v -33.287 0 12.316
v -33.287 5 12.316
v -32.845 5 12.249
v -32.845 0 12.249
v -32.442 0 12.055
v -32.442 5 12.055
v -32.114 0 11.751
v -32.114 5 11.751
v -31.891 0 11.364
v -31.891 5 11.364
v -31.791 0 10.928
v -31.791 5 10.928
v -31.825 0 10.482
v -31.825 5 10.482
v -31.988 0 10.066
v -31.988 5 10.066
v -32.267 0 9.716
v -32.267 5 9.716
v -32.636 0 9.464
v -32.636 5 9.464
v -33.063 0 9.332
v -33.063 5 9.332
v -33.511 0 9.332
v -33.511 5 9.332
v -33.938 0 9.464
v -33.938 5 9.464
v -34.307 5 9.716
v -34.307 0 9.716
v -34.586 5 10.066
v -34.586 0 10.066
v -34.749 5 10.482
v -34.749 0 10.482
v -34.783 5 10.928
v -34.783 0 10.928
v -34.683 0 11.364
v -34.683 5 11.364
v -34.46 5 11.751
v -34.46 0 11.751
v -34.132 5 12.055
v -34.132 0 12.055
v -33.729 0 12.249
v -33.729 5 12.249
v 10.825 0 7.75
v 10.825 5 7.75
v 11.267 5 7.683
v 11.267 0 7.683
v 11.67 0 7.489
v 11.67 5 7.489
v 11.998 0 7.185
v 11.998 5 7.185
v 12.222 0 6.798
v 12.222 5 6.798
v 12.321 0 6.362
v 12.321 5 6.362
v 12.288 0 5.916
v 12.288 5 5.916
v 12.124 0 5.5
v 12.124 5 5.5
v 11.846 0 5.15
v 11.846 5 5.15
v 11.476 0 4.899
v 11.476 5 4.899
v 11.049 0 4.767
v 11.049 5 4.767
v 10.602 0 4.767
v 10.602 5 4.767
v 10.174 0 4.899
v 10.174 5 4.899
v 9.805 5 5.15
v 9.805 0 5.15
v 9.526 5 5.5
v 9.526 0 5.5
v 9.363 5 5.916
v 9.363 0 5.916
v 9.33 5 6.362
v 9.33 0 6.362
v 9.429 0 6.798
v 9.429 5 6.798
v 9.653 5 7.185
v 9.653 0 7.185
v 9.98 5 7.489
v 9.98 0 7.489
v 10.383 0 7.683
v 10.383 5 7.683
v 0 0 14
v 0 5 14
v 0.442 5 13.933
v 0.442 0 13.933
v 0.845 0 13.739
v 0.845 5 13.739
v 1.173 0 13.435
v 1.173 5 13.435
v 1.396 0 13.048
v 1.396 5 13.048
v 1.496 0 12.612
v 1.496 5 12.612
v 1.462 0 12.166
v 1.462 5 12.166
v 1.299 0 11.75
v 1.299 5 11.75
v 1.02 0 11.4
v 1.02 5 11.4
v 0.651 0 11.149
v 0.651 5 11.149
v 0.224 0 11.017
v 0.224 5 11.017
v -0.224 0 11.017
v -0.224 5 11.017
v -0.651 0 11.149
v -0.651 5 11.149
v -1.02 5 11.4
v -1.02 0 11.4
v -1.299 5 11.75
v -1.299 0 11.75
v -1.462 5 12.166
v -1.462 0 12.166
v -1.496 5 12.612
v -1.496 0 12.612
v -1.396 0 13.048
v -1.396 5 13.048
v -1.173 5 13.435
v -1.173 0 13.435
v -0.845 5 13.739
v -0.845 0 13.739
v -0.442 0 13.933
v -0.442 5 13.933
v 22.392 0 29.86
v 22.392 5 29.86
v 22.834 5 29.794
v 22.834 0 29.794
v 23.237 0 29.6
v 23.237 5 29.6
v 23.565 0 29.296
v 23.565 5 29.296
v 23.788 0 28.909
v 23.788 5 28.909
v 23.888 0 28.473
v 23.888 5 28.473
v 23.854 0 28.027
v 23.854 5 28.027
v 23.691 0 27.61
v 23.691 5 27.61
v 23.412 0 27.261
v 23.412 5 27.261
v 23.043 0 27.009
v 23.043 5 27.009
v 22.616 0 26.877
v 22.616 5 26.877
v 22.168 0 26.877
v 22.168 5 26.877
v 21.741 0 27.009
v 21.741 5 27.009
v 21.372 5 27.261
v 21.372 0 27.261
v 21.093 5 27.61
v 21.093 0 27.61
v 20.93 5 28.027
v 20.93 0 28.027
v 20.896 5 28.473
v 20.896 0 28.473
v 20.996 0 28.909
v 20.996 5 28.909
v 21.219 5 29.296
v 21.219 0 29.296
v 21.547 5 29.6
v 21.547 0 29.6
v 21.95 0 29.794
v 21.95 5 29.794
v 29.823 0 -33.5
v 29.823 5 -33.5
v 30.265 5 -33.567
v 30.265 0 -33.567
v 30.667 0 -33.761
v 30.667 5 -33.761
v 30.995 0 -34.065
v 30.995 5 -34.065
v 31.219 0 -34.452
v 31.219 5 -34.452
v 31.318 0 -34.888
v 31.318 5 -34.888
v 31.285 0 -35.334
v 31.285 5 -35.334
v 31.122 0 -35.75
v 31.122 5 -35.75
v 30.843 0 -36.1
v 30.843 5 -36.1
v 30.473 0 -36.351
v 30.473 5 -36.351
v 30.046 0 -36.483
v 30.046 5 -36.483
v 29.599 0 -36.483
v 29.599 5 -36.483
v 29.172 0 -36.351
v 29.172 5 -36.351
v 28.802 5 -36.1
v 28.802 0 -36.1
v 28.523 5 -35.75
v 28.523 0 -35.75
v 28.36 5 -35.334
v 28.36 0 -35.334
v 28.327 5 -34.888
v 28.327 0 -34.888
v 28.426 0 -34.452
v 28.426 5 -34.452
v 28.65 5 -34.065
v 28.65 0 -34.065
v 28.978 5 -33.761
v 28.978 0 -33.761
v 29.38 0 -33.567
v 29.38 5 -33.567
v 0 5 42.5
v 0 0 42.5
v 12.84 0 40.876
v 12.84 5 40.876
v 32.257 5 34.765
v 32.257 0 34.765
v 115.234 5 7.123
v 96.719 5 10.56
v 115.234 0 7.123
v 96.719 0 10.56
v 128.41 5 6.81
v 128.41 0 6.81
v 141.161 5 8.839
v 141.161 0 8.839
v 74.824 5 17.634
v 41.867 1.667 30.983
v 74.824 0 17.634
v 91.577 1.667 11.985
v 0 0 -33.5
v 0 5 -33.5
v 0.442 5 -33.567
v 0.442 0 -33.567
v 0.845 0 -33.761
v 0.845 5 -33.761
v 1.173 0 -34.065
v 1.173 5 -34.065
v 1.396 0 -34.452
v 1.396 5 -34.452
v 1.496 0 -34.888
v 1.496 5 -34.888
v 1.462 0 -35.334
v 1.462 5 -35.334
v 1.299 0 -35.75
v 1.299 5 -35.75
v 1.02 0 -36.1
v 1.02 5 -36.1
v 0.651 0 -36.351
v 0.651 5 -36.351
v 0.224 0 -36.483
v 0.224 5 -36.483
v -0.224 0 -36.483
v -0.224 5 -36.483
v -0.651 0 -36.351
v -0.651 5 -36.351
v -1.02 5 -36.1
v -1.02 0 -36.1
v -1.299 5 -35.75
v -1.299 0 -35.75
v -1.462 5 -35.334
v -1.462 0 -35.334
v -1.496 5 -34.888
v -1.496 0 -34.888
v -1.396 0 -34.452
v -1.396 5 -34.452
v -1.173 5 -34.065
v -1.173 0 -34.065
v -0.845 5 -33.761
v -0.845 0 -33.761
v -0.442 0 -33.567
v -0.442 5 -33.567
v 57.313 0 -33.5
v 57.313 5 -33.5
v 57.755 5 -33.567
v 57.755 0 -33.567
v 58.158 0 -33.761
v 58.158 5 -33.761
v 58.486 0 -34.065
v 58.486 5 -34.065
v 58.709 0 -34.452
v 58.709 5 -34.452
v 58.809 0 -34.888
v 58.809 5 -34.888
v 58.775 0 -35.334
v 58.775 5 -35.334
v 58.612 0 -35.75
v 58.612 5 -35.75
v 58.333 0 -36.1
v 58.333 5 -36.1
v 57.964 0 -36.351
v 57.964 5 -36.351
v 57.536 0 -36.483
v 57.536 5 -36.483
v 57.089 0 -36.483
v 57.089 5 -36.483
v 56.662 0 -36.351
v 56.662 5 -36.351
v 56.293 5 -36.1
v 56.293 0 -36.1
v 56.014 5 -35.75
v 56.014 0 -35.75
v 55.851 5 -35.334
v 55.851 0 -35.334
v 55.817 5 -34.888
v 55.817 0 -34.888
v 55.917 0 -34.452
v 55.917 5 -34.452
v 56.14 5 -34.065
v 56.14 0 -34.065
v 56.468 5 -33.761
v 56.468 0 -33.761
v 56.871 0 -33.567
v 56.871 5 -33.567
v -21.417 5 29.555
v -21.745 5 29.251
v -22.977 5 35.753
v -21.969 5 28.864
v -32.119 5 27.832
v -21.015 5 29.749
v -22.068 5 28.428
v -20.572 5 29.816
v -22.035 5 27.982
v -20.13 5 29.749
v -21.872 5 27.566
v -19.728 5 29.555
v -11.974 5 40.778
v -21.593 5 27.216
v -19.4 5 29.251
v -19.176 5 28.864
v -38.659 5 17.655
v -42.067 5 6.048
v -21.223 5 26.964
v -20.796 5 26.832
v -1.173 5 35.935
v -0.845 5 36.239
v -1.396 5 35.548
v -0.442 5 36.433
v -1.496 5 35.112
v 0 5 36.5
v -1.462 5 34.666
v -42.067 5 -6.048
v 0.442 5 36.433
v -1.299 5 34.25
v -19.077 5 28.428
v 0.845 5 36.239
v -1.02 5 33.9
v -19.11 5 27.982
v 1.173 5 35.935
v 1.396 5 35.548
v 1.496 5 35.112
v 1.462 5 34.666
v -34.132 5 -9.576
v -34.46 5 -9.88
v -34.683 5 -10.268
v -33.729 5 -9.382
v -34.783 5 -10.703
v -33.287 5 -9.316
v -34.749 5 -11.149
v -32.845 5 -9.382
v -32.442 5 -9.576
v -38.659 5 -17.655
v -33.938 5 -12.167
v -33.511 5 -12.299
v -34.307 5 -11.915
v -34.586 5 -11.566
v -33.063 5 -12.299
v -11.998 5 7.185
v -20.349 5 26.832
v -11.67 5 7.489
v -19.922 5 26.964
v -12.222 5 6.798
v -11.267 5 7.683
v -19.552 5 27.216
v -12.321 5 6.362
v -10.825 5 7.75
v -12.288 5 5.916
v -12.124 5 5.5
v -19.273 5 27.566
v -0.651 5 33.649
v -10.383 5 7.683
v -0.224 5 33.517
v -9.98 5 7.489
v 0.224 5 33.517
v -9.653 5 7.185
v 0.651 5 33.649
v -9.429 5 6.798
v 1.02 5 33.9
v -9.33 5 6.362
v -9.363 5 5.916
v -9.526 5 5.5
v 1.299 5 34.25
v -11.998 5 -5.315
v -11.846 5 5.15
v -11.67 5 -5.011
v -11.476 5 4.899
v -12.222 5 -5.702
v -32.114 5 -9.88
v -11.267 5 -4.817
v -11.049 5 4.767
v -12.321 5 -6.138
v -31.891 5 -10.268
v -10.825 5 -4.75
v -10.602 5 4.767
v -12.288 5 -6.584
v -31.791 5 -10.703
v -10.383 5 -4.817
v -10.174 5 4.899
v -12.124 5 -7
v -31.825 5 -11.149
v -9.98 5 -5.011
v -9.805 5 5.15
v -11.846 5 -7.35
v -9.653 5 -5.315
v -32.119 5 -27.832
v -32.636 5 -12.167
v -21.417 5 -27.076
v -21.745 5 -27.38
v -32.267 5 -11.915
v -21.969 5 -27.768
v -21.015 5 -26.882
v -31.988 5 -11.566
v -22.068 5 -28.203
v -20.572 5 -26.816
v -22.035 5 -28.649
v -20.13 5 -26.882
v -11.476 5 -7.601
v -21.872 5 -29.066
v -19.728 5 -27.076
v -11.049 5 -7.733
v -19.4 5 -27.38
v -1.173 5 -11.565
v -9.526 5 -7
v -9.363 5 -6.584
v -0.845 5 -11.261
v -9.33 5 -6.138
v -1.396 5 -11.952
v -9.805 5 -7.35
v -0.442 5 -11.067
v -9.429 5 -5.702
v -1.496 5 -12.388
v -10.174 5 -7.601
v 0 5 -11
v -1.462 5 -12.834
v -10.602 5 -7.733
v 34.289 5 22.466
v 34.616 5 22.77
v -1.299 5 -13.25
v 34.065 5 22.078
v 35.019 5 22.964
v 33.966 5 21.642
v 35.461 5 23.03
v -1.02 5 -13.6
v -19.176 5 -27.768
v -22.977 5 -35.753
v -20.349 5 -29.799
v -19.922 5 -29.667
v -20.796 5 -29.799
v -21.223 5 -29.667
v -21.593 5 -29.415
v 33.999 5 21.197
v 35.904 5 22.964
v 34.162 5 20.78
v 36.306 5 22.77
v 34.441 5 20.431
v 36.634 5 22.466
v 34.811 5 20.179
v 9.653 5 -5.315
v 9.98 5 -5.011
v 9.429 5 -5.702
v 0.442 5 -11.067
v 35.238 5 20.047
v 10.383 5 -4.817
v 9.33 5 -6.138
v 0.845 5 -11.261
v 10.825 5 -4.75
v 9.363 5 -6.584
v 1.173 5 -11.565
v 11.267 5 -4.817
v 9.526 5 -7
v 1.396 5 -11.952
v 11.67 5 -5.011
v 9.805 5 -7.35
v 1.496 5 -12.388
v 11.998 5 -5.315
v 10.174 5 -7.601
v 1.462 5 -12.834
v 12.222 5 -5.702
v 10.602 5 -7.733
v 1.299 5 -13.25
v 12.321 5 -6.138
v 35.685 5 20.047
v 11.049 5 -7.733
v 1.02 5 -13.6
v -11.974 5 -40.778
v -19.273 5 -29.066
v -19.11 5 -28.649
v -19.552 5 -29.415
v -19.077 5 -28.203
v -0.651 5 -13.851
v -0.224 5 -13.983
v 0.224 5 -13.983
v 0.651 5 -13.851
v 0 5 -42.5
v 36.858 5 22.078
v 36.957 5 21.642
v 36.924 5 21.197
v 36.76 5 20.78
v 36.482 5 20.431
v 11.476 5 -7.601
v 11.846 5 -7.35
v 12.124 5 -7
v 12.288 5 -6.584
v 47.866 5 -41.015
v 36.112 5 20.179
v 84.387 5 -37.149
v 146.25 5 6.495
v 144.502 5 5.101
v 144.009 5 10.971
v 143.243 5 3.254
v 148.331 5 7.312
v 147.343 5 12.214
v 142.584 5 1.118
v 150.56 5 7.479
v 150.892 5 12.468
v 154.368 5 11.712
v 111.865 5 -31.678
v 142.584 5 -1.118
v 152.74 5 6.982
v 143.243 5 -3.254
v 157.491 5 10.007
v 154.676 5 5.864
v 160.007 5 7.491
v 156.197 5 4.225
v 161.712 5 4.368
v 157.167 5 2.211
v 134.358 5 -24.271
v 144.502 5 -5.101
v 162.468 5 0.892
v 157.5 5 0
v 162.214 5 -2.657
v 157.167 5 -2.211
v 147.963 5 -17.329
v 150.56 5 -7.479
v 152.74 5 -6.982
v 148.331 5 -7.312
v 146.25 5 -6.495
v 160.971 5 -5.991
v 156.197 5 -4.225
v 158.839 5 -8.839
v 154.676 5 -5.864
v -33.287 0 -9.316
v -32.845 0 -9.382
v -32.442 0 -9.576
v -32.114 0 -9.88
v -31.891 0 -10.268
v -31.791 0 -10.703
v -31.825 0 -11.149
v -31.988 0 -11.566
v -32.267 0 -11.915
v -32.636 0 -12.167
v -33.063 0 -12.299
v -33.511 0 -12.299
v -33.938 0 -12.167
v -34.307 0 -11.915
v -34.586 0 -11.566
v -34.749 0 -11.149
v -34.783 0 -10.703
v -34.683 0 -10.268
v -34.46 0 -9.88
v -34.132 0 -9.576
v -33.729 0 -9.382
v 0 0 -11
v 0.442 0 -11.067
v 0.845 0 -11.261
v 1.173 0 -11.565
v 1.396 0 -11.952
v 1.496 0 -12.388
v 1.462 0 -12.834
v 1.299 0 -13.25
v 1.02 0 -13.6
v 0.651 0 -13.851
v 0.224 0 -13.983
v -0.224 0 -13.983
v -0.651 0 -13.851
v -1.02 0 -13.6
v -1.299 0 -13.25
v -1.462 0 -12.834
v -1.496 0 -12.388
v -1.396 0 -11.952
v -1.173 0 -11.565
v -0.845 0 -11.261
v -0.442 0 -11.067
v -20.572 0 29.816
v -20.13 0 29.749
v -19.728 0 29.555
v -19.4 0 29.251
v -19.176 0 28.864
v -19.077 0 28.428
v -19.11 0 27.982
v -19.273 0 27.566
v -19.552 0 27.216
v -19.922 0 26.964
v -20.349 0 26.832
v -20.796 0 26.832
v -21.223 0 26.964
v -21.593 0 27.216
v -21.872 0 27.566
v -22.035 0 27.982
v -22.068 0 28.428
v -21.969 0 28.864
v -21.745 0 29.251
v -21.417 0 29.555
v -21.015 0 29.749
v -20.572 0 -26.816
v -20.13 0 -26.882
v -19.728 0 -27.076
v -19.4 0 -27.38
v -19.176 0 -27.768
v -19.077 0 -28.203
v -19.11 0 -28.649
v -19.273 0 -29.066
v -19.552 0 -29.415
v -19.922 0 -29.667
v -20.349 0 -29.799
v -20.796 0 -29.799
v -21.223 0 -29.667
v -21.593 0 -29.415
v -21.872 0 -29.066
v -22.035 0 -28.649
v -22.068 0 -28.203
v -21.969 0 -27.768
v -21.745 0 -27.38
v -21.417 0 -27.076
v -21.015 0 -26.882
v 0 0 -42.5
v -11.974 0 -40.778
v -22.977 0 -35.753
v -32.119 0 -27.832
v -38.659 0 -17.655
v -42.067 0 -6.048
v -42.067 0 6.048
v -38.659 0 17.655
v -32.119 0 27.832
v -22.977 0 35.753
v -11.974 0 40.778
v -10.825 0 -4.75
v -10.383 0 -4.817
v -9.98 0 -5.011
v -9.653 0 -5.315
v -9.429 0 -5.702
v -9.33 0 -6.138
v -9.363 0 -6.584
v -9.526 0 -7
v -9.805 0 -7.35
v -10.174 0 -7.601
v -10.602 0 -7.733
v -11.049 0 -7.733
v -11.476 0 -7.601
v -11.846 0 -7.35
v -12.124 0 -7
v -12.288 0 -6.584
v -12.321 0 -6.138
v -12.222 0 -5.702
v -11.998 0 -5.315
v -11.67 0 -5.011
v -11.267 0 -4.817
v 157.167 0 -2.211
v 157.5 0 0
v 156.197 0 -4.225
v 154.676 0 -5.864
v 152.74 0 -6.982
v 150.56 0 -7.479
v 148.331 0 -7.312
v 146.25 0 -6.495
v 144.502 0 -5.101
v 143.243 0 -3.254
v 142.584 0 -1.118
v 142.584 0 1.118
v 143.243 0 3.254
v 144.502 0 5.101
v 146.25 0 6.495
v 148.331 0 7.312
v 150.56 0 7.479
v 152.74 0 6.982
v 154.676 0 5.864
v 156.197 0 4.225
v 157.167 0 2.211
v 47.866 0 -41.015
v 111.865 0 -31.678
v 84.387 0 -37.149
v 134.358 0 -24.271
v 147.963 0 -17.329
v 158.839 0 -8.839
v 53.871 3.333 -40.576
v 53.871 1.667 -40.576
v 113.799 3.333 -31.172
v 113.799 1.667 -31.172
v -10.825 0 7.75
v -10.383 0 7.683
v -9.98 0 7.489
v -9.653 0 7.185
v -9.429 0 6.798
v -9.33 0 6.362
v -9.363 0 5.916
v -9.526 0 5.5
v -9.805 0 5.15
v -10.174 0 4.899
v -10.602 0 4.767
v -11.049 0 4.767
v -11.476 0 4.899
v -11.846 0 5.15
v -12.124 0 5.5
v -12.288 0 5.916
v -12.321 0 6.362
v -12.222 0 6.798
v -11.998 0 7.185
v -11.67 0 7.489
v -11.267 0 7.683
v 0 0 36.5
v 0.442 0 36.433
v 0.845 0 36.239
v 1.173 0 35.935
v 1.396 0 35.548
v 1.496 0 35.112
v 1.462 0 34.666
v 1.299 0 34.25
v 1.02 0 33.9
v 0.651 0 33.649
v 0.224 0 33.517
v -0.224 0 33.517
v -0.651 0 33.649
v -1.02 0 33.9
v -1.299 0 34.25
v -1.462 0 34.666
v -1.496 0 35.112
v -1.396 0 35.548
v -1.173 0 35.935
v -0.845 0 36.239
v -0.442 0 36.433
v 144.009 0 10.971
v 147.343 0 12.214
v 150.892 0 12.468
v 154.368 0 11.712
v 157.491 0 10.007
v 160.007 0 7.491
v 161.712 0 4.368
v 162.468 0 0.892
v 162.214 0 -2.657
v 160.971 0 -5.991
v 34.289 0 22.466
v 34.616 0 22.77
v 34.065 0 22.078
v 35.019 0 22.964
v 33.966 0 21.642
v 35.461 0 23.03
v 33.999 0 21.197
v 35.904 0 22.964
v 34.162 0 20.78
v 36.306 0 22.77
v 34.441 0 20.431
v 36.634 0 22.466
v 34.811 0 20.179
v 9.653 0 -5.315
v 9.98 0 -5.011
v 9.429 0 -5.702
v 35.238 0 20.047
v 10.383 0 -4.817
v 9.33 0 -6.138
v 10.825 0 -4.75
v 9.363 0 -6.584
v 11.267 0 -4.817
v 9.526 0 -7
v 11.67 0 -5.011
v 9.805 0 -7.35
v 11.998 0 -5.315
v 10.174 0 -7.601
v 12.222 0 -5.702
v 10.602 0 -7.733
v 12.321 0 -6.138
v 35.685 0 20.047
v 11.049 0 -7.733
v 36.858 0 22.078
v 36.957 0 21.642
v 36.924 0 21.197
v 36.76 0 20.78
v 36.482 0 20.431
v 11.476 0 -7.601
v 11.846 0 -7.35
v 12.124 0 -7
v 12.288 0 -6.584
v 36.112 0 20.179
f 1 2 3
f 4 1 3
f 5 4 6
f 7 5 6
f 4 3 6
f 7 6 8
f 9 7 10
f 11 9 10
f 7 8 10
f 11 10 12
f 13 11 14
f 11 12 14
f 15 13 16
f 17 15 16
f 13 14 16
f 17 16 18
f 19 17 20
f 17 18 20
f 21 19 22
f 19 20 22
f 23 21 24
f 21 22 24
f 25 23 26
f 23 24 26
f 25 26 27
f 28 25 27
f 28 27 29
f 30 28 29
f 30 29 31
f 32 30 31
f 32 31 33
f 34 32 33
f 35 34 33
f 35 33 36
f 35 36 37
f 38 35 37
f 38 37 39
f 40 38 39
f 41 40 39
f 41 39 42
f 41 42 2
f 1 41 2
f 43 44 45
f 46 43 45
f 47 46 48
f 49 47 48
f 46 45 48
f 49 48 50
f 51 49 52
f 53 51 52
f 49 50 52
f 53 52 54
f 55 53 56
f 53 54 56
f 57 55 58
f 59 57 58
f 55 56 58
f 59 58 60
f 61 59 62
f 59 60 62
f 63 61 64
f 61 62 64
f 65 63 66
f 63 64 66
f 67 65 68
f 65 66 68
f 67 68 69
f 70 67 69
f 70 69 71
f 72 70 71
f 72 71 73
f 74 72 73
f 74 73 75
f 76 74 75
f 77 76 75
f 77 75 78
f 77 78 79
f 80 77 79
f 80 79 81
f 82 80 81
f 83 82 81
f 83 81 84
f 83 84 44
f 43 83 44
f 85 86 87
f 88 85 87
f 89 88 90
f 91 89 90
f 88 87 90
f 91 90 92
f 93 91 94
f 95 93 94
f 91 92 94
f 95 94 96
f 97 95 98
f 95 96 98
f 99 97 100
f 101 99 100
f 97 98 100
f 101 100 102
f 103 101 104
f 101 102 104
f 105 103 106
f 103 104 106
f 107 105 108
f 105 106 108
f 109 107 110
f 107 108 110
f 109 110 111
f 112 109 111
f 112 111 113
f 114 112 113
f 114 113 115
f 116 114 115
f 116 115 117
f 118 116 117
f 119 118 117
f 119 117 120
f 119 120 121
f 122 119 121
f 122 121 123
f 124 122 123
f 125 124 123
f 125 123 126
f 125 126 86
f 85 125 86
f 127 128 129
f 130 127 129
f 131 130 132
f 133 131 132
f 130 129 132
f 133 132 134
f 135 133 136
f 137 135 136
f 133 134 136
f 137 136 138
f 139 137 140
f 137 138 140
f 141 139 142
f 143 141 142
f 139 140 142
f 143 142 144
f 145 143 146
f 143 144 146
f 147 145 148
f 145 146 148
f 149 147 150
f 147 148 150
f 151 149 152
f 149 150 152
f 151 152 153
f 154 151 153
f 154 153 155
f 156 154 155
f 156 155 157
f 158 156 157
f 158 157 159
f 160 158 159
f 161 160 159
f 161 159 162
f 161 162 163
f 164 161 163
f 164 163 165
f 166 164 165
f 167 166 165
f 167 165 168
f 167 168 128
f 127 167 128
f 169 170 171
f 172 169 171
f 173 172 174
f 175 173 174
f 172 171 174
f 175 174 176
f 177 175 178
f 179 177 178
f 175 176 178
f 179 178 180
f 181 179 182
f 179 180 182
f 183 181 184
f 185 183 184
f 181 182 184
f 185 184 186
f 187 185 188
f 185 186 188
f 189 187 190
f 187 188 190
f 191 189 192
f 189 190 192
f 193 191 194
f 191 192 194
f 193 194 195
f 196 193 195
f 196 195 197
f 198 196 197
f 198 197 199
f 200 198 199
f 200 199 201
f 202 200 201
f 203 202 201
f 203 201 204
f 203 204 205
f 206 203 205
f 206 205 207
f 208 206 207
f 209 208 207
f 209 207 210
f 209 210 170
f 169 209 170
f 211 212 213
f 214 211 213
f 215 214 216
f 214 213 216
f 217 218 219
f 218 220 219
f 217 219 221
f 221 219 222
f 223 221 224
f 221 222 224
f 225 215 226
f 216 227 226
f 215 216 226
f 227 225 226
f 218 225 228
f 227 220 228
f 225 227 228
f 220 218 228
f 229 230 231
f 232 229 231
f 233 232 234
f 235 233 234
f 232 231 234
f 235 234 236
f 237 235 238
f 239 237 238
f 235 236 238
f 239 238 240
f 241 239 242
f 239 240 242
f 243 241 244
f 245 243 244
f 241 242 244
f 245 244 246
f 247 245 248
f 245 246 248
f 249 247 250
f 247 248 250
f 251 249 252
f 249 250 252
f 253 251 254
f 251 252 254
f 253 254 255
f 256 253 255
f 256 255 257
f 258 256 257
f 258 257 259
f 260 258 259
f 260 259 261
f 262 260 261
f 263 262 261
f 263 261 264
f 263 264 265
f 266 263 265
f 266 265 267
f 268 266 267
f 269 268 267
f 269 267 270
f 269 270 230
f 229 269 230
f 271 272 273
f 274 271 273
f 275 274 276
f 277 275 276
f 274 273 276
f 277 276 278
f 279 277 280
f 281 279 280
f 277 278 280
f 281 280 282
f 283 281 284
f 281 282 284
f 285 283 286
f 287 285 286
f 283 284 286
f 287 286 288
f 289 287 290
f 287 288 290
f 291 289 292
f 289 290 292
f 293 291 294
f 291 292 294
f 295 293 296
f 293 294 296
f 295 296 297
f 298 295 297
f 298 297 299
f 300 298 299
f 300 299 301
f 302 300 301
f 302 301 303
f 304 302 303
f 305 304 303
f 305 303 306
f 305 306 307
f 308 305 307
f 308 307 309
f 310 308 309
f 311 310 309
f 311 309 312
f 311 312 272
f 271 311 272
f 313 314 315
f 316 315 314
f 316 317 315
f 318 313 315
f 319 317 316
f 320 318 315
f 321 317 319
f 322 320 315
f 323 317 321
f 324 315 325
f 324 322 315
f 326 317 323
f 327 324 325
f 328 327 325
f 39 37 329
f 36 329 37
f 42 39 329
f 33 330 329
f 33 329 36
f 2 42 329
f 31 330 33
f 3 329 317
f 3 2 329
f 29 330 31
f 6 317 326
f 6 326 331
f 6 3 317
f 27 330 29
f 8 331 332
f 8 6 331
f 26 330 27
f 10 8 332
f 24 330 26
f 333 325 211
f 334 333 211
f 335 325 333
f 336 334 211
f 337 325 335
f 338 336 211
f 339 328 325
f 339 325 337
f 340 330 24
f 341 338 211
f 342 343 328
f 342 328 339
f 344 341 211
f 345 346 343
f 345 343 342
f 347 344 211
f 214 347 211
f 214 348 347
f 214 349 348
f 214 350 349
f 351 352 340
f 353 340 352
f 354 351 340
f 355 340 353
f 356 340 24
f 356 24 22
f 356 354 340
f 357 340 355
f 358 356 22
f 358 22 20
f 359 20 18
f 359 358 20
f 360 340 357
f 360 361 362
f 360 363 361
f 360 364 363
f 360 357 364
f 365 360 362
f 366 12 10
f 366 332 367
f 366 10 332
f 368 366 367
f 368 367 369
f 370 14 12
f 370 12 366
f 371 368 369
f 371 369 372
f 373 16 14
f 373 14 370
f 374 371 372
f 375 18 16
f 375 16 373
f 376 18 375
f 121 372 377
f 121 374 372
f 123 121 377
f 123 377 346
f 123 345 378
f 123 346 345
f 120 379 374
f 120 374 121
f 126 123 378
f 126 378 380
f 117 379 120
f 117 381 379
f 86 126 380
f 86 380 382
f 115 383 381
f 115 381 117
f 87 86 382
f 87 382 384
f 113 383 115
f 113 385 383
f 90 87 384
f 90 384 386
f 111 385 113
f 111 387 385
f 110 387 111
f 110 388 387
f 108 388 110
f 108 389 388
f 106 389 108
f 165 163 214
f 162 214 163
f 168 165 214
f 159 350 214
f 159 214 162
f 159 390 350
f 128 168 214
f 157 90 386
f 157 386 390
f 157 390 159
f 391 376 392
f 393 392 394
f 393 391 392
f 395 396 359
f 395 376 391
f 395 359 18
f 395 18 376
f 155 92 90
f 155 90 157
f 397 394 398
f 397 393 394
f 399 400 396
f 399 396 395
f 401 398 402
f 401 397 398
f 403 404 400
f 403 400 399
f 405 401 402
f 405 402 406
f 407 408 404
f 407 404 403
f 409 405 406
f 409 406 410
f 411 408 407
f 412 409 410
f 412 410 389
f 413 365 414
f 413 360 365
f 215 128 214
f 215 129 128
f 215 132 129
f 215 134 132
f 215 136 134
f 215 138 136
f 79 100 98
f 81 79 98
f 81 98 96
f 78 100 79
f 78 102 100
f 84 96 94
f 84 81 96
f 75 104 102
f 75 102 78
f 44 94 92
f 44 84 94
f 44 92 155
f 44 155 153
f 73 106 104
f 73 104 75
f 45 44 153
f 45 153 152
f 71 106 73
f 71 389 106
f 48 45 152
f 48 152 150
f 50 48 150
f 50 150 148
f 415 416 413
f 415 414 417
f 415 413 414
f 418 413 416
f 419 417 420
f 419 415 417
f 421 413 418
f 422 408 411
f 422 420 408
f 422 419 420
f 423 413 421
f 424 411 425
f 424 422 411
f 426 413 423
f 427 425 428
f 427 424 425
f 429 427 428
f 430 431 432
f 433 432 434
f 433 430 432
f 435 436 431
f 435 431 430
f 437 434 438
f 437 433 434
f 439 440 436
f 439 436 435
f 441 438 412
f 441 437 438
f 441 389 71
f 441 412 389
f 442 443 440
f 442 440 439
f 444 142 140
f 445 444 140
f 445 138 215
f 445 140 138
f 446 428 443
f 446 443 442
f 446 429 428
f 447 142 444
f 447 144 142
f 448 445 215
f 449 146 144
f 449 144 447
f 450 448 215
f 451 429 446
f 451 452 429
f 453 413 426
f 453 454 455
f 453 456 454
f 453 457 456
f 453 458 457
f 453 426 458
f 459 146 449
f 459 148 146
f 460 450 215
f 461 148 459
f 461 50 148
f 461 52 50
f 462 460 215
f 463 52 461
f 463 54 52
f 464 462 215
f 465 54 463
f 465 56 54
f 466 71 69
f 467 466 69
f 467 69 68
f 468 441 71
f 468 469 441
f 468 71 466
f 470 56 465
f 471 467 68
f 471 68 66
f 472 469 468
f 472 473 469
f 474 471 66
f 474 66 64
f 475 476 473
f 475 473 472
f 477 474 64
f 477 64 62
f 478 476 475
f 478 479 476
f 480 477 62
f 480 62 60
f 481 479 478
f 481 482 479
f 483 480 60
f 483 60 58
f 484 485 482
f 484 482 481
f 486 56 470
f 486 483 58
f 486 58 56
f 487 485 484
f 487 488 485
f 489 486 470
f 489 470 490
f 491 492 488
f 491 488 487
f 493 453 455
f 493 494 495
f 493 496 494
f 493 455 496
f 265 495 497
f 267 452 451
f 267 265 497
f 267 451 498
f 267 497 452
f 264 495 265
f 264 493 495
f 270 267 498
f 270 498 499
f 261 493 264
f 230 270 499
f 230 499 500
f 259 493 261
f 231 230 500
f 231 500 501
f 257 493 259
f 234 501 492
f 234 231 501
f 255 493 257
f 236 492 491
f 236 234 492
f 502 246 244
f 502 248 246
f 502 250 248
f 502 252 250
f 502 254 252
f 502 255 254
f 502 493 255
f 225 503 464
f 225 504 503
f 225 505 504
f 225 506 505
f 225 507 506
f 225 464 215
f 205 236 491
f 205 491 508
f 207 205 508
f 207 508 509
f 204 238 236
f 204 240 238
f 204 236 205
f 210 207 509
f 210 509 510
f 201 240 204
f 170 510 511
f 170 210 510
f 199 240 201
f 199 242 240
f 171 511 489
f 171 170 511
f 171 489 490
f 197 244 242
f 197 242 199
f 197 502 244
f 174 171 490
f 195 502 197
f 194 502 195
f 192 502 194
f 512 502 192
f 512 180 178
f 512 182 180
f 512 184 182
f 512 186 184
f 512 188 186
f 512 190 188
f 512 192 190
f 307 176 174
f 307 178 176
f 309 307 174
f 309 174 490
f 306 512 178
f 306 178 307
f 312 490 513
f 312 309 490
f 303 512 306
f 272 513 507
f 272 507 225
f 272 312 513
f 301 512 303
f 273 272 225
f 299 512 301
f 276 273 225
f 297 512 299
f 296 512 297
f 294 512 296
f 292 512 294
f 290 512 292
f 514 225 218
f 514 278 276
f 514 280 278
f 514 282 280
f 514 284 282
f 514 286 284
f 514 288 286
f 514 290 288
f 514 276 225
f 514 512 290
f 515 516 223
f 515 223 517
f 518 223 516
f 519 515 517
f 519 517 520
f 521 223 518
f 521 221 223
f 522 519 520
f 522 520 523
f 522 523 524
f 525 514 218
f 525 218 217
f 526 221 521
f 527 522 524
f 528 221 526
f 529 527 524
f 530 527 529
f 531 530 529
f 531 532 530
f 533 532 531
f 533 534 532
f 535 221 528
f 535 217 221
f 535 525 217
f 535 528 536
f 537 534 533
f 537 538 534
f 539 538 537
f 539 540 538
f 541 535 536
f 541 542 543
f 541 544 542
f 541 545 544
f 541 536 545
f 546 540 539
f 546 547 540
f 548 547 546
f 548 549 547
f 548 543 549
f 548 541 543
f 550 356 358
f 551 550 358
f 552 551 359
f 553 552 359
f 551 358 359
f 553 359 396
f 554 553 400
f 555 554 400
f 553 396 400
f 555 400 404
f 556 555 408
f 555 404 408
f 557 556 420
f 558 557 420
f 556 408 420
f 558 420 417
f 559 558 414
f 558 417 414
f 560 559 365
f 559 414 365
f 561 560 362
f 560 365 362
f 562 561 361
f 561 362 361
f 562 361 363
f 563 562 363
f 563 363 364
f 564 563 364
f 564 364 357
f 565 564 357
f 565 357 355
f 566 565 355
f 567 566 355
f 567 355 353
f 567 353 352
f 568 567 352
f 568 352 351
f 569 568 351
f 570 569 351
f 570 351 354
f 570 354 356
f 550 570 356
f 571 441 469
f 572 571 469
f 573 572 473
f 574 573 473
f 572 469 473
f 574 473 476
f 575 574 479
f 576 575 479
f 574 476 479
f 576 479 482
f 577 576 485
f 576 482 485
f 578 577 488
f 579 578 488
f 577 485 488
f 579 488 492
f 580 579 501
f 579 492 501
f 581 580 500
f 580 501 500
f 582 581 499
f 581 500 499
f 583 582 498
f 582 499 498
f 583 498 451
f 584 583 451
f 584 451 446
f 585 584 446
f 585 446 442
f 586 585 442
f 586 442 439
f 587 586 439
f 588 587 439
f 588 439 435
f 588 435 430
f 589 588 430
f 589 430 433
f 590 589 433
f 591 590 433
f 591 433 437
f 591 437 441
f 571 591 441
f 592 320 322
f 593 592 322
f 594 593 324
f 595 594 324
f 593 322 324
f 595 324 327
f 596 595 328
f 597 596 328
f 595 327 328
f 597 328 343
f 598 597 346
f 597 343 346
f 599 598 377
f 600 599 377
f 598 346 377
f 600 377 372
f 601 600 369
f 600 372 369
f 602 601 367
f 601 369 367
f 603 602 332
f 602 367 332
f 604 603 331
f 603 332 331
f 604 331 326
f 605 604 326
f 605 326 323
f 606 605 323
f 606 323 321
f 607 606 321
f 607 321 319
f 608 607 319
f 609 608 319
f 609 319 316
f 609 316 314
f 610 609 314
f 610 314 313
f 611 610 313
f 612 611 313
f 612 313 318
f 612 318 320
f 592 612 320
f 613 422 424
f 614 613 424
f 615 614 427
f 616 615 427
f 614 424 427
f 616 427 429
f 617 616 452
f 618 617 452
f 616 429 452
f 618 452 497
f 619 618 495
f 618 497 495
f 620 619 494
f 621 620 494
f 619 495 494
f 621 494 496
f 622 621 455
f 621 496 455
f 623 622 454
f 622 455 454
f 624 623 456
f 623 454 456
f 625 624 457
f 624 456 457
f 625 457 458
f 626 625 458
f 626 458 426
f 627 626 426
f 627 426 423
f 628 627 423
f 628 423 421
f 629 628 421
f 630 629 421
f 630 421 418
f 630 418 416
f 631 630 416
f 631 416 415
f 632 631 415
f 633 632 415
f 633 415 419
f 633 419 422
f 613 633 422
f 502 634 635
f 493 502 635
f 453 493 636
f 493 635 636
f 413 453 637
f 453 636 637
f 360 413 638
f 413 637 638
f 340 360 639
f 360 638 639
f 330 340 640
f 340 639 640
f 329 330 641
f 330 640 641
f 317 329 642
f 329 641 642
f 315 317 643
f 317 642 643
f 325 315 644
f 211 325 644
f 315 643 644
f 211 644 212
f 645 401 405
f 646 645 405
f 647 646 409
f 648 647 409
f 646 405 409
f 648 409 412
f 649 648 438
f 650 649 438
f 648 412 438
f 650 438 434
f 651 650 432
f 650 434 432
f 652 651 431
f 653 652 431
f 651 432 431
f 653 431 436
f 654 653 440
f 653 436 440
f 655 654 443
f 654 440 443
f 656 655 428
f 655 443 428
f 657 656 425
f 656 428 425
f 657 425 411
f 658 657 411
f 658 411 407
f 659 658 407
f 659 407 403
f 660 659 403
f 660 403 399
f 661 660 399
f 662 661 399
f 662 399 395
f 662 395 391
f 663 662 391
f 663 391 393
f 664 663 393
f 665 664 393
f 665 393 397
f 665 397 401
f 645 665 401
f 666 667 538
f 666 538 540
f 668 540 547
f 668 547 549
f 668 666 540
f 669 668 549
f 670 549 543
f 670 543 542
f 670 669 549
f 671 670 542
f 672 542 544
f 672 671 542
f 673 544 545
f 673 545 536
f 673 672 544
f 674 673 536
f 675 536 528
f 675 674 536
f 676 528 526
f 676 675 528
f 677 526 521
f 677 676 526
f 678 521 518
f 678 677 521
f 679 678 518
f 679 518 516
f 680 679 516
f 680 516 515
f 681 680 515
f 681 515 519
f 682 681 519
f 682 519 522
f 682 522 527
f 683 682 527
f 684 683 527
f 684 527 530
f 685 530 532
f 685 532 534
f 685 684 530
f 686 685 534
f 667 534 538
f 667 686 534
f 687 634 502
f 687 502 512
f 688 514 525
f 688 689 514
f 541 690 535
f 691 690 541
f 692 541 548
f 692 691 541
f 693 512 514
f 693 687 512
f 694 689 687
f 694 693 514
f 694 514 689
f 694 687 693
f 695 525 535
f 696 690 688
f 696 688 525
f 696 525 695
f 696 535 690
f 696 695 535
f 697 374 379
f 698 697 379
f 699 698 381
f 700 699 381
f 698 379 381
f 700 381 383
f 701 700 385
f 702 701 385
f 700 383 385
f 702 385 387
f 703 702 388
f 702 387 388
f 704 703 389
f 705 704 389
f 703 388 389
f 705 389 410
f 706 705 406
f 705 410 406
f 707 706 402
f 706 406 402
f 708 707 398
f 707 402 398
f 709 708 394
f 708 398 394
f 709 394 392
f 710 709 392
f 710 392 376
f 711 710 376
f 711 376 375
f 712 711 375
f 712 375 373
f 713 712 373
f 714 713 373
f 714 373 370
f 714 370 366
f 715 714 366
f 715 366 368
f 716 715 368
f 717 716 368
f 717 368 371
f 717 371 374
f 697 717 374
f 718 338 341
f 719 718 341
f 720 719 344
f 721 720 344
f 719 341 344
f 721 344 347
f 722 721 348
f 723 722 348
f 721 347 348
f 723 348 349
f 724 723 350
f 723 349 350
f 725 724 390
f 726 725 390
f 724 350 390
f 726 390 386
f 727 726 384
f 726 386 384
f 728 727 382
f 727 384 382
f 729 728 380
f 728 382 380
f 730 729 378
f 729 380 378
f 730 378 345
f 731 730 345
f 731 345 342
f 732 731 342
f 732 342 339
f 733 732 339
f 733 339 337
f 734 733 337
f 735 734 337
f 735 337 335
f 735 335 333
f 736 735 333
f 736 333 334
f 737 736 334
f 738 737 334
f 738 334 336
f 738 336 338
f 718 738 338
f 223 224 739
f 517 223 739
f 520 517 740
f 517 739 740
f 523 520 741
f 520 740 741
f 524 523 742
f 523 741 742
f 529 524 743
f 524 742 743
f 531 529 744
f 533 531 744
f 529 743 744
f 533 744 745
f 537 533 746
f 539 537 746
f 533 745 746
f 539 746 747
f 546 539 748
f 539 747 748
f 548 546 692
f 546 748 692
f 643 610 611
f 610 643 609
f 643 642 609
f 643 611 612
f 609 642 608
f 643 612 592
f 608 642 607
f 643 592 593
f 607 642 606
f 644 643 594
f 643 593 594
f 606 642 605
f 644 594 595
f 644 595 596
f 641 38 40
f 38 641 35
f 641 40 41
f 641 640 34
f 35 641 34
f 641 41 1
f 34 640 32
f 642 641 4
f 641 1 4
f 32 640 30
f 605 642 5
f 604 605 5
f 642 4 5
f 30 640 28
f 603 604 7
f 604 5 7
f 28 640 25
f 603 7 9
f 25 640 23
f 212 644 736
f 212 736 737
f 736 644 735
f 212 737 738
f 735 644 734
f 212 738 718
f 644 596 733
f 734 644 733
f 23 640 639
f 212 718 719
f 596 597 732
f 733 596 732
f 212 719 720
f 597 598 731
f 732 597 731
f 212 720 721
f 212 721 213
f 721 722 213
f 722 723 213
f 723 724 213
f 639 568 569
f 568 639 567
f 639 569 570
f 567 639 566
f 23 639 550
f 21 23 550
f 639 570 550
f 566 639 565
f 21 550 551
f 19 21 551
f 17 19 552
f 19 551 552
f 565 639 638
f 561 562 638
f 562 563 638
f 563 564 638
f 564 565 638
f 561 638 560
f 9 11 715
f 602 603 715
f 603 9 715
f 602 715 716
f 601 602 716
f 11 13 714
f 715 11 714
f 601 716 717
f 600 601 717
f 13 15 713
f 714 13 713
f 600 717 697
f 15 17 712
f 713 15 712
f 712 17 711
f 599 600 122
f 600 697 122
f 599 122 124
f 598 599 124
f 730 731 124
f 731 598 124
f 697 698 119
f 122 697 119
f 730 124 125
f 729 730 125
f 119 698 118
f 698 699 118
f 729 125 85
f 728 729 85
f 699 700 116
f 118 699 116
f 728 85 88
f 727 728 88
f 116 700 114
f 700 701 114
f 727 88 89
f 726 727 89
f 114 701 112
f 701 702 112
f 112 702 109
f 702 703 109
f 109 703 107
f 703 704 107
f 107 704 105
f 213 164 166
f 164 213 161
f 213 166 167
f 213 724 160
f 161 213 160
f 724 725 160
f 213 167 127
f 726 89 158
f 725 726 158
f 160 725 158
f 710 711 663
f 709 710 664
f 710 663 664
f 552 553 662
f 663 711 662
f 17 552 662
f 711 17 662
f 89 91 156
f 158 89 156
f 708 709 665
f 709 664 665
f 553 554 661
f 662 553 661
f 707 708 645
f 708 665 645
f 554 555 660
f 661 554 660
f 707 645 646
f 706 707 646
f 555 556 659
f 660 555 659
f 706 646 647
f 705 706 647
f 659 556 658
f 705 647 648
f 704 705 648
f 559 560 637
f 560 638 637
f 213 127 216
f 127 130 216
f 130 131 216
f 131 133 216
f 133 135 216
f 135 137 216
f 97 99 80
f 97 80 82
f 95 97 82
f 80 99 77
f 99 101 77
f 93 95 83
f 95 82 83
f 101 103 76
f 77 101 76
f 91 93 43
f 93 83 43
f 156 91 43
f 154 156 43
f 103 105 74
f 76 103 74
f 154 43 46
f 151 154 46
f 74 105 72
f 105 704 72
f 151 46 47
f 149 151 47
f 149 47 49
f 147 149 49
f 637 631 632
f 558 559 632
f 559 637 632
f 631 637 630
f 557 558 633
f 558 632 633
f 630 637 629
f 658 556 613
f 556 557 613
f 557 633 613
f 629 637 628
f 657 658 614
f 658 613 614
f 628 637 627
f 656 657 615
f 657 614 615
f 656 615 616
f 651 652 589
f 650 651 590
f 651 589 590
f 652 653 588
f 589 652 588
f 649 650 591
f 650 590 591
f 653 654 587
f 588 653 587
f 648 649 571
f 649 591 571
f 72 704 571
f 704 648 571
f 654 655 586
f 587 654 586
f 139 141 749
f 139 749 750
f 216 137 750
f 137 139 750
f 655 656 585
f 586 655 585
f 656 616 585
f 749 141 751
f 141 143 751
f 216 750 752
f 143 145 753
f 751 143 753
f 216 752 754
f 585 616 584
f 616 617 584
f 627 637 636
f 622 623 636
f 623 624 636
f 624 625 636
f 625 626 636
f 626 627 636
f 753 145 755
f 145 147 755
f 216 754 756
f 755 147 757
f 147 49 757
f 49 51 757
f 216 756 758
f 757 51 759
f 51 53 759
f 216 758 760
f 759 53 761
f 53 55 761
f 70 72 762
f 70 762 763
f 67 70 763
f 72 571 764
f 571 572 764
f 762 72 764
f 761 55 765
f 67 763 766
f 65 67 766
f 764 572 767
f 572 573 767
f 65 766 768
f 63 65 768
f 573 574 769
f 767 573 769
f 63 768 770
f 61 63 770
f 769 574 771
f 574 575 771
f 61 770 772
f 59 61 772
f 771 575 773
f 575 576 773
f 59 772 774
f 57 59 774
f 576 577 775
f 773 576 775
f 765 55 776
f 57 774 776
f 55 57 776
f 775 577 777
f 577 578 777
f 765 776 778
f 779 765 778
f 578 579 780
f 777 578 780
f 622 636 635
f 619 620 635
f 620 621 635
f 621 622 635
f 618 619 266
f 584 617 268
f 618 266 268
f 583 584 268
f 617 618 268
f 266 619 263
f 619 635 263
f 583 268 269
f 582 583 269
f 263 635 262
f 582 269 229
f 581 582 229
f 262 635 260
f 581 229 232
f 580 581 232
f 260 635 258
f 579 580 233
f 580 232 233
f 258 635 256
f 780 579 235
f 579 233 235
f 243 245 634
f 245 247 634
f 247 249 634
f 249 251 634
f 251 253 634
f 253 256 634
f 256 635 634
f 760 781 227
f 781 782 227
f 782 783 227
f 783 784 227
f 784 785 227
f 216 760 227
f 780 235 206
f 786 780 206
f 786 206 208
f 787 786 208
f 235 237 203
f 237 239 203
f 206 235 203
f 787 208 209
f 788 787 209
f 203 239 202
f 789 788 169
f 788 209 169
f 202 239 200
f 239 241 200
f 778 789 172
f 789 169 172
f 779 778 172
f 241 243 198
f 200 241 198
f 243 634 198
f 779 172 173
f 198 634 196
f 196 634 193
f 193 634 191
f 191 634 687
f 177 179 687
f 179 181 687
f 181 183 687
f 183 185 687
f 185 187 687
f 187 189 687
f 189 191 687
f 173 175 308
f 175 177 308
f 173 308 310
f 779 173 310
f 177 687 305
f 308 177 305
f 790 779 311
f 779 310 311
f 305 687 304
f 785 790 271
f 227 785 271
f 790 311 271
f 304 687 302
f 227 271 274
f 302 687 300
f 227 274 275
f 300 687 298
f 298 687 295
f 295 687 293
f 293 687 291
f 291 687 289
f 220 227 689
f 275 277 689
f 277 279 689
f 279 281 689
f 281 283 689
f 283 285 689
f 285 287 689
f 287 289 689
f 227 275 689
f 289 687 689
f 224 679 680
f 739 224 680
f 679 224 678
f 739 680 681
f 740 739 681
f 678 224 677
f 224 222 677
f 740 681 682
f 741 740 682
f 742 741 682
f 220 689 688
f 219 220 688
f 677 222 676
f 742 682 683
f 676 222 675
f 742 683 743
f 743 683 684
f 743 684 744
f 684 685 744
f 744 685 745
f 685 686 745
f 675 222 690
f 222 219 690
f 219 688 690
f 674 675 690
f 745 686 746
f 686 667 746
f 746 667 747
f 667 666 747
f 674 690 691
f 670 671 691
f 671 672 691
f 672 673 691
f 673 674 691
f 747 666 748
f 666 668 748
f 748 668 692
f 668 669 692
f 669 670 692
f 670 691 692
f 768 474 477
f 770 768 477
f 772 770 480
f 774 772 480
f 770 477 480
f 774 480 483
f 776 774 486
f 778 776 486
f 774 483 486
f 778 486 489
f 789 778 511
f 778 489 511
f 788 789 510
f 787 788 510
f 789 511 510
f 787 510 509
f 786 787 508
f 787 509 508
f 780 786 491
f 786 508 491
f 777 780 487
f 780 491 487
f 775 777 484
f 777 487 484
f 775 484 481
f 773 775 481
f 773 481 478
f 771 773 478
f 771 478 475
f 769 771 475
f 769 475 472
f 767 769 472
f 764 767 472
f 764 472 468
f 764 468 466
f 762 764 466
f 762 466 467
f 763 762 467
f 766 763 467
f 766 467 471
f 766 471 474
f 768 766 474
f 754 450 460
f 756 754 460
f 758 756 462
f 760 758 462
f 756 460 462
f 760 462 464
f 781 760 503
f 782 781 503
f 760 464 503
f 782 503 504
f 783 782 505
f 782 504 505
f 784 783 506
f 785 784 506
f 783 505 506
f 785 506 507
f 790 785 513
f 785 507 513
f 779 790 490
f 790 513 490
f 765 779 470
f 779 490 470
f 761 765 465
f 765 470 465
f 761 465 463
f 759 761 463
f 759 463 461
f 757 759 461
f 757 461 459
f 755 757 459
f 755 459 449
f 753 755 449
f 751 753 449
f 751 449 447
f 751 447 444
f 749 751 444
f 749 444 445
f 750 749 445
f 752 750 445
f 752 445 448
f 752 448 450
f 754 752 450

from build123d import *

# Parameters (mm, degrees)
BOSS_EXTRUDE3_OUTLINE_R = 7.5
BOSS_EXTRUDE3_DEPTH     = 5
SKETCH2_R               = 1.5
CUT_EXTRUDE1_DEPTH      = 10
SKETCH3_R               = 1.5
CUT_EXTRUDE2_DEPTH      = 10
SKETCH4_R               = 1.5
CUT_EXTRUDE3_DEPTH      = 10


# Read off the part's stored shape, not the designer's step: Boss-Extrude3
with BuildPart() as part:
    # Boss-Extrude3 outline → Boss-Extrude3 (new body)
    with BuildSketch(Plane(origin=(0, 0, 0), x_dir=(1, 0, 0), z_dir=(0, 1, 0))):
        with BuildLine():
            ThreePointArc((0, 42.5), (-42.5, 0), (0, -42.5))
            add(Edge.make_bspline(
                [(0, -42.5), (35.287909835, -42.5), (94.296573589, 3.71849472), (141.161165235, -8.838834765)],
                knots=[0, 0, 0, 0, 1, 1, 1, 1], degree=3))
            ThreePointArc((141.161165235, -8.838834765), (158.838834765, -8.838834765), (158.838834765, 8.838834765))
            add(Edge.make_bspline(
                [(0, 42.5), (43.860357416, 42.5), (128.226009794, 39.451659736), (158.838834765, 8.838834765)],
                knots=[0, 0, 0, 0, 1, 1, 1, 1], degree=3))
        make_face()
        with Locations((150, 0)):
            Circle(BOSS_EXTRUDE3_OUTLINE_R, mode=Mode.SUBTRACT)
    extrude(amount=BOSS_EXTRUDE3_DEPTH)

    # Sketch2 → Cut-Extrude1 (cut)
    with BuildSketch(Plane(origin=(0, 5, 0), x_dir=(1, 0, 0), z_dir=(0, 1, 0))):
        with Locations(Location((0, 35, 0), (0, 0, 270))):
            Circle(SKETCH2_R)
        with Locations(Location((0, 12.5, 0), (0, 0, 270))):
            Circle(SKETCH2_R)
        with Locations(Location((10.825317547, 6.25, 0), (0, 0, 270))):
            Circle(SKETCH2_R)
        with Locations(Location((10.825317547, -6.25, 0), (0, 0, 270))):
            Circle(SKETCH2_R)
        with Locations(Location((0, -12.5, 0), (0, 0, 270))):
            Circle(SKETCH2_R)
        with Locations(Location((-10.825317547, -6.25, 0), (0, 0, 270))):
            Circle(SKETCH2_R)
        with Locations(Location((-10.825317547, 6.25, 0), (0, 0, 270))):
            Circle(SKETCH2_R)
        with Locations(Location((-20.57248383, 28.315594803, 0), (0, 0, 270))):
            Circle(SKETCH2_R)
        with Locations(Location((-33.28697807, 10.815594803, 0), (0, 0, 270))):
            Circle(SKETCH2_R)
        with Locations(Location((-33.28697807, -10.815594803, 0), (0, 0, 270))):
            Circle(SKETCH2_R)
        with Locations(Location((-20.57248383, -28.315594803, 0), (0, 0, 270))):
            Circle(SKETCH2_R)
        with Locations(Location((0, -35, 0), (0, 0, 270))):
            Circle(SKETCH2_R)
    extrude(amount=-CUT_EXTRUDE1_DEPTH, mode=Mode.SUBTRACT)

    # Sketch3 → Cut-Extrude2 (cut)
    with BuildSketch(Plane(origin=(0, 5, 0), x_dir=(1, 0, 0), z_dir=(0, 1, 0))):
        with Locations(Location((29.822508304, 35, 0), (0, 0, 270))):
            Circle(SKETCH3_R)
        with Locations(Location((57.312909887, 35, 0), (0, 0, 270))):
            Circle(SKETCH3_R)
    extrude(amount=-CUT_EXTRUDE2_DEPTH, mode=Mode.SUBTRACT)

    # Sketch4 → Cut-Extrude3 (cut)
    with BuildSketch(Plane(origin=(0, 5, 0), x_dir=(1, 0, 0), z_dir=(0, 1, 0))):
        with Locations(Location((35.461413578, -21.530349116, 0), (0, 0, 270))):
            Circle(SKETCH4_R)
        with Locations(Location((22.392043347, -28.36049342, 0), (0, 0, 270))):
            Circle(SKETCH4_R)
    extrude(amount=-CUT_EXTRUDE3_DEPTH, mode=Mode.SUBTRACT)


solid = part.part
